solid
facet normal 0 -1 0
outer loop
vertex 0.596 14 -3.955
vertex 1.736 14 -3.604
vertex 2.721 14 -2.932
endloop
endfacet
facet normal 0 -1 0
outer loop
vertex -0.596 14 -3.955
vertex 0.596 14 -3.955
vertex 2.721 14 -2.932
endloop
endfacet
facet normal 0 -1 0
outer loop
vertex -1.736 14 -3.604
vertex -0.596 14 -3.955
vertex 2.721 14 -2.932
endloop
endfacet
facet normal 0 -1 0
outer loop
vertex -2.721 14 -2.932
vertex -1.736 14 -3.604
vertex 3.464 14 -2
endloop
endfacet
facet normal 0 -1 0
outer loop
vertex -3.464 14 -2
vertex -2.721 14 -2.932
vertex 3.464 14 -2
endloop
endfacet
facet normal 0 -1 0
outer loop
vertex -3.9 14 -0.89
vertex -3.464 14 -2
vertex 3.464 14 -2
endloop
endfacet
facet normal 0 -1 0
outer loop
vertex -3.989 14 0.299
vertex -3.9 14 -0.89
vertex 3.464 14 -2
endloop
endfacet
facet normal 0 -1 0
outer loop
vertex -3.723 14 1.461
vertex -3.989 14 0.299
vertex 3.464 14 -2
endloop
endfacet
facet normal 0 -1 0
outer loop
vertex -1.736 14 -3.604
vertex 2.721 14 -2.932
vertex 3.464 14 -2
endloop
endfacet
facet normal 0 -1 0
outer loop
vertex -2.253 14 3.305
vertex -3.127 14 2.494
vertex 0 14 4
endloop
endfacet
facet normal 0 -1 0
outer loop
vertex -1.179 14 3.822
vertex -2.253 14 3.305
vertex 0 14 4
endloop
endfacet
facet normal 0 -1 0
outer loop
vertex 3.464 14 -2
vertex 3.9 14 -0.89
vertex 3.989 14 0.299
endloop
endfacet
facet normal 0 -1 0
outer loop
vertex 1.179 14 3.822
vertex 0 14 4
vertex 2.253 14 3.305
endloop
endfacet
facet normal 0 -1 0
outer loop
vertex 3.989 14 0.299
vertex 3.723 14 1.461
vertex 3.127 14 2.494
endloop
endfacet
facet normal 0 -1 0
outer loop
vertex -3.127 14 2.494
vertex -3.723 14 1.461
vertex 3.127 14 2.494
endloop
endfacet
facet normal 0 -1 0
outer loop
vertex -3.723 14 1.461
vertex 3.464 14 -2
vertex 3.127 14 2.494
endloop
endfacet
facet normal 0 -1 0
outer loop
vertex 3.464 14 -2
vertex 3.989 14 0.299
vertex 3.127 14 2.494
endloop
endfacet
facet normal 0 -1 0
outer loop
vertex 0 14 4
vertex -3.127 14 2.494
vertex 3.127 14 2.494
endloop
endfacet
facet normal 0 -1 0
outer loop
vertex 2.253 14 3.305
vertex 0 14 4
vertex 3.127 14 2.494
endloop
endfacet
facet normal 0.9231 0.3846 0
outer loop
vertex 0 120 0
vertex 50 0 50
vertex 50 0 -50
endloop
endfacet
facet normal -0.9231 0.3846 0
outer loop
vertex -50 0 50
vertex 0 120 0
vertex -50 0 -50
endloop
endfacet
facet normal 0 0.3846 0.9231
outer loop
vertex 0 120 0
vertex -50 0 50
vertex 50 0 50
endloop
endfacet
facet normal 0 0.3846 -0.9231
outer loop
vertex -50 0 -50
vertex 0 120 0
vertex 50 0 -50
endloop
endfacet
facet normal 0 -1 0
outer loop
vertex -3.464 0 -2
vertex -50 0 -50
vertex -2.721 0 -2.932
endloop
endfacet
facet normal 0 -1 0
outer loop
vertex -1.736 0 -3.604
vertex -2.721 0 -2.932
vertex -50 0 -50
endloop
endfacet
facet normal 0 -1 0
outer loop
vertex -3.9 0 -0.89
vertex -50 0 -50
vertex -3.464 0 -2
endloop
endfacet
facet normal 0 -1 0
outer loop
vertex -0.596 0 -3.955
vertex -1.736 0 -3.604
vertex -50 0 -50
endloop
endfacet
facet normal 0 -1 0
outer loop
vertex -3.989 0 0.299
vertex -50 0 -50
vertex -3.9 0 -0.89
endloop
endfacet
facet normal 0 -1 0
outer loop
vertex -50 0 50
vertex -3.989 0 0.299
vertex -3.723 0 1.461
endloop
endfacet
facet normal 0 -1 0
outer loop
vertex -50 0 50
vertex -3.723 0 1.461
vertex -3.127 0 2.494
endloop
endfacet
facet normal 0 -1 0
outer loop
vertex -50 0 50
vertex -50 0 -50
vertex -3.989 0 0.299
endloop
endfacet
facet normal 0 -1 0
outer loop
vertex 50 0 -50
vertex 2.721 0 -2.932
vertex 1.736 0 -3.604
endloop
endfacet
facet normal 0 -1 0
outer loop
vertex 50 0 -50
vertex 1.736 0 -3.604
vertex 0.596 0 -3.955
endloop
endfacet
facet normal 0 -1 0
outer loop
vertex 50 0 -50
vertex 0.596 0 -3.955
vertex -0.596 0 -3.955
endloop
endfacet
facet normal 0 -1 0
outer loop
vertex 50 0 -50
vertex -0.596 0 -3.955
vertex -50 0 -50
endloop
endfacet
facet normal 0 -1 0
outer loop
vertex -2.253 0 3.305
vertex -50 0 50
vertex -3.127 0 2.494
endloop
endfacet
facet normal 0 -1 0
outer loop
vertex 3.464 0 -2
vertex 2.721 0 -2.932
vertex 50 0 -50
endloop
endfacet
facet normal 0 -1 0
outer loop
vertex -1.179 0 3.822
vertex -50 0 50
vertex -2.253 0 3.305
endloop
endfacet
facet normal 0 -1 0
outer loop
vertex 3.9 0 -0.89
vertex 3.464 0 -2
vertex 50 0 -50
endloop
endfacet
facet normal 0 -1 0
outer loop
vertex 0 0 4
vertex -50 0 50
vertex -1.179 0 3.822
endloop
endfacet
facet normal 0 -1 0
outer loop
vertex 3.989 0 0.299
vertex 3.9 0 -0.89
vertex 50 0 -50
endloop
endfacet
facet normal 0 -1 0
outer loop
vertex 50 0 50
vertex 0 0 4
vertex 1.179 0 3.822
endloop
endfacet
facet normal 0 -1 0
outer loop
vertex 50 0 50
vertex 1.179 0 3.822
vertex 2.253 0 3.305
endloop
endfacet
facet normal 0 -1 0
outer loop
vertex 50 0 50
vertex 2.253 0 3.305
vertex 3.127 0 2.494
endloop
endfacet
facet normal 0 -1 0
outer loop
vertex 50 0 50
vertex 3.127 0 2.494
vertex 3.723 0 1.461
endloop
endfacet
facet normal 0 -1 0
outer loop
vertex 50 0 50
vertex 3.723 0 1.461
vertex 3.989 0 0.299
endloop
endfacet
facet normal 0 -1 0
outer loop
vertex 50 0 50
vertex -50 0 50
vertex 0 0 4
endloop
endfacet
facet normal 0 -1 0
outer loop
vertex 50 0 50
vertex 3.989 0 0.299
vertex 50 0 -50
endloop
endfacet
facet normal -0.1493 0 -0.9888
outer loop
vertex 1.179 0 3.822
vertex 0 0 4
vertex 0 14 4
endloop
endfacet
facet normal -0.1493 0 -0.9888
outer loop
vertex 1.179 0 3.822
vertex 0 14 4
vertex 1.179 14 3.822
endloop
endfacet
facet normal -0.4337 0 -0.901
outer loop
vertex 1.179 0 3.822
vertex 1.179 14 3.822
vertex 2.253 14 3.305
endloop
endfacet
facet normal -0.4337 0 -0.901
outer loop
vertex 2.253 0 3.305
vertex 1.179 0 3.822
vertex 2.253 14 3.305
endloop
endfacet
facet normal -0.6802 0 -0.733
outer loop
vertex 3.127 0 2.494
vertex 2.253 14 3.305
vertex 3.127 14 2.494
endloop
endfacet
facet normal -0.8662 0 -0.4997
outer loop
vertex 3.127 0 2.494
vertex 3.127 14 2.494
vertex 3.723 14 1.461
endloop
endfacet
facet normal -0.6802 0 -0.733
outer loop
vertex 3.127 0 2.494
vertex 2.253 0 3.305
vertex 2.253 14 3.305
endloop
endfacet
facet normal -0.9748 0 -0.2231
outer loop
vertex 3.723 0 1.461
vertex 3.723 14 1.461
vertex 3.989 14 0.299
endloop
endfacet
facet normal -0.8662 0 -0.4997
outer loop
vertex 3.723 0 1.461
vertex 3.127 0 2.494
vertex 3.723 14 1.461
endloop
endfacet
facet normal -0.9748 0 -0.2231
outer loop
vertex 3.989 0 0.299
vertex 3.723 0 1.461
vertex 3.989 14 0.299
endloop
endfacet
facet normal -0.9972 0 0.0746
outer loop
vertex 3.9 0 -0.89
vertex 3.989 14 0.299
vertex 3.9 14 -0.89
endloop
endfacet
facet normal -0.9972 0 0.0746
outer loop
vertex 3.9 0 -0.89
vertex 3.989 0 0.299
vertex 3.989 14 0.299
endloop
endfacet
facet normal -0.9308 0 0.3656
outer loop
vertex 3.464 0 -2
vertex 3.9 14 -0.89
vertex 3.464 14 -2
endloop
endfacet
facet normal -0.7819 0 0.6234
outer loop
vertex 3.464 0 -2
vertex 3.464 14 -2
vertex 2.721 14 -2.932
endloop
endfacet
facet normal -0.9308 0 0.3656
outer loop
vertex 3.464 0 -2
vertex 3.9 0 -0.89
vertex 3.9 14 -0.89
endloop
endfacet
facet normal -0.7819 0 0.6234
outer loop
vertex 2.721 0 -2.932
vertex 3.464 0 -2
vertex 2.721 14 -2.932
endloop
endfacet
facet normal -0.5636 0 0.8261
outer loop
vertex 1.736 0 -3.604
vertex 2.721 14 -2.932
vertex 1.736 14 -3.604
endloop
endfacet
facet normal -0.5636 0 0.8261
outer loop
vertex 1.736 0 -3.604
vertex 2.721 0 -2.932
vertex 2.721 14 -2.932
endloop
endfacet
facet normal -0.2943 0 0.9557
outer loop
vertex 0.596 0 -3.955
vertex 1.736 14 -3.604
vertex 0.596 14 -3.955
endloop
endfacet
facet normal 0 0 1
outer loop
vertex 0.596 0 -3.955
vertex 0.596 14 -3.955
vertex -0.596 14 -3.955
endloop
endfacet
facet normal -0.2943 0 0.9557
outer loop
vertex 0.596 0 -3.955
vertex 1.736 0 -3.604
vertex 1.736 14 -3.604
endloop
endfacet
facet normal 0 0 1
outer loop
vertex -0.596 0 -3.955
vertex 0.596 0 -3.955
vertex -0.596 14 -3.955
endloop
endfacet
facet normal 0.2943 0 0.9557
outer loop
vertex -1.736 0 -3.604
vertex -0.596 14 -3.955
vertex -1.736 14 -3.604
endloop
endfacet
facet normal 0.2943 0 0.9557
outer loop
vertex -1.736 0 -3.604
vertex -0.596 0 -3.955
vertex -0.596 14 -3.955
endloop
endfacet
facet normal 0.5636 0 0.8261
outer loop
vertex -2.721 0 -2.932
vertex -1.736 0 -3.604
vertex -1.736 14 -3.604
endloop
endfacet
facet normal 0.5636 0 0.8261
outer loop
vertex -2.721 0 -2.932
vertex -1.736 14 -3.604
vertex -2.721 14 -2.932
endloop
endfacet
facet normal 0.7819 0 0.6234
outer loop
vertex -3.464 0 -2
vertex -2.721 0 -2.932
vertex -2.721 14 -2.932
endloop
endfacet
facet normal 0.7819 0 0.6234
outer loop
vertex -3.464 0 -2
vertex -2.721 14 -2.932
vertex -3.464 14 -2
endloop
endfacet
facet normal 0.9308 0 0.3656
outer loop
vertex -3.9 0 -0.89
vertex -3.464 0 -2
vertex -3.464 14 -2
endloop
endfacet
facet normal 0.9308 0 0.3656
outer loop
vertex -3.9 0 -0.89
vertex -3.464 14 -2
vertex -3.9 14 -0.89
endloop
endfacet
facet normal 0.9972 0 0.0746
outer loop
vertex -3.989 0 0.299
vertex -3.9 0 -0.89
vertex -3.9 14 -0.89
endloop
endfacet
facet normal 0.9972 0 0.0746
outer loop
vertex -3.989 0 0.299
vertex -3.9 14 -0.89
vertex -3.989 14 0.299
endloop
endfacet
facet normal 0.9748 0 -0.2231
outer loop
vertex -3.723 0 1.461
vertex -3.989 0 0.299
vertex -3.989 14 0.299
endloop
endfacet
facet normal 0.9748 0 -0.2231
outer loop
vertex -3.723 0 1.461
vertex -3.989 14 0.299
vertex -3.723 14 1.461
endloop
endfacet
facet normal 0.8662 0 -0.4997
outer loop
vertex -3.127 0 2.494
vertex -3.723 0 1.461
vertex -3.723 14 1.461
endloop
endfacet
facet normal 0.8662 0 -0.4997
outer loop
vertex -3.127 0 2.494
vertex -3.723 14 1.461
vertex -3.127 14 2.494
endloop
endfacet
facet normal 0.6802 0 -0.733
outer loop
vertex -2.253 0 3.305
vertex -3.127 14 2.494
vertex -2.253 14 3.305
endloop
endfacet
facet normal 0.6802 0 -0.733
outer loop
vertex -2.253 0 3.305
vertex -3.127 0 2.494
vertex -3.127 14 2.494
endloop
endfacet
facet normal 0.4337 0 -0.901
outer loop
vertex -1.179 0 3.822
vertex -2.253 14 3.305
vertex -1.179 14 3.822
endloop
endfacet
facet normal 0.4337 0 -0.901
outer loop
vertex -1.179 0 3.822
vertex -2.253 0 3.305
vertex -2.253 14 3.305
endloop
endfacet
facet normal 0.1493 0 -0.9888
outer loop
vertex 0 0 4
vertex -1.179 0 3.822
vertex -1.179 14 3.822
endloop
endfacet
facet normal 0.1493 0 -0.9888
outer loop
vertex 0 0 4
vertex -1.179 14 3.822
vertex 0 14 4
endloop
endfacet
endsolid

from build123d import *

# Parameters (mm, degrees)
CUNA_DEPTH                        = 50
RECORTE_CARAS_PIRAMIDE_DEPTH      = 140.283882772
RECORTE_CARAS_PIRAMIDE_DEPTH_BACK = 140.283882772
CROQUIS_AGUJEROS_MONTAJE_R        = 4
AGUJERO_INSERTO_M6_DEPTH          = 14


with BuildPart() as part:
    # Croquis_triangulo_frontal → Cuna (new, symmetric)
    with BuildSketch(Plane.XY):
        Polygon((-50, 0), (50, 0), (0, 120), align=None)
    extrude(amount=CUNA_DEPTH, both=True)

    # Croquis_recorte_lateral → Recorte_caras_piramide (cut, two sides: drawn at the far end of the back side and taken through both)
    with BuildSketch(Plane(origin=(0, 0, 0), x_dir=(0, 0, -1), z_dir=(1, 0, 0)).offset(-RECORTE_CARAS_PIRAMIDE_DEPTH_BACK)):
        Polygon((-60, 0), (-50, 0), (0, 120), (50, 0), (60, 0), (60, 130), (-60, 130), align=None)
    extrude(amount=RECORTE_CARAS_PIRAMIDE_DEPTH + RECORTE_CARAS_PIRAMIDE_DEPTH_BACK, mode=Mode.SUBTRACT)

    # Croquis_agujeros_montaje → Agujero_inserto_M6 (cut)
    with BuildSketch(Plane(origin=(0, 0, 0), x_dir=(1, 0, 0), z_dir=(0, 1, 0))):
        with Locations(Location((0, 0, 0), (0, 0, 270))):
            Circle(CROQUIS_AGUJEROS_MONTAJE_R)
    extrude(amount=AGUJERO_INSERTO_M6_DEPTH, mode=Mode.SUBTRACT)


solid = part.part
